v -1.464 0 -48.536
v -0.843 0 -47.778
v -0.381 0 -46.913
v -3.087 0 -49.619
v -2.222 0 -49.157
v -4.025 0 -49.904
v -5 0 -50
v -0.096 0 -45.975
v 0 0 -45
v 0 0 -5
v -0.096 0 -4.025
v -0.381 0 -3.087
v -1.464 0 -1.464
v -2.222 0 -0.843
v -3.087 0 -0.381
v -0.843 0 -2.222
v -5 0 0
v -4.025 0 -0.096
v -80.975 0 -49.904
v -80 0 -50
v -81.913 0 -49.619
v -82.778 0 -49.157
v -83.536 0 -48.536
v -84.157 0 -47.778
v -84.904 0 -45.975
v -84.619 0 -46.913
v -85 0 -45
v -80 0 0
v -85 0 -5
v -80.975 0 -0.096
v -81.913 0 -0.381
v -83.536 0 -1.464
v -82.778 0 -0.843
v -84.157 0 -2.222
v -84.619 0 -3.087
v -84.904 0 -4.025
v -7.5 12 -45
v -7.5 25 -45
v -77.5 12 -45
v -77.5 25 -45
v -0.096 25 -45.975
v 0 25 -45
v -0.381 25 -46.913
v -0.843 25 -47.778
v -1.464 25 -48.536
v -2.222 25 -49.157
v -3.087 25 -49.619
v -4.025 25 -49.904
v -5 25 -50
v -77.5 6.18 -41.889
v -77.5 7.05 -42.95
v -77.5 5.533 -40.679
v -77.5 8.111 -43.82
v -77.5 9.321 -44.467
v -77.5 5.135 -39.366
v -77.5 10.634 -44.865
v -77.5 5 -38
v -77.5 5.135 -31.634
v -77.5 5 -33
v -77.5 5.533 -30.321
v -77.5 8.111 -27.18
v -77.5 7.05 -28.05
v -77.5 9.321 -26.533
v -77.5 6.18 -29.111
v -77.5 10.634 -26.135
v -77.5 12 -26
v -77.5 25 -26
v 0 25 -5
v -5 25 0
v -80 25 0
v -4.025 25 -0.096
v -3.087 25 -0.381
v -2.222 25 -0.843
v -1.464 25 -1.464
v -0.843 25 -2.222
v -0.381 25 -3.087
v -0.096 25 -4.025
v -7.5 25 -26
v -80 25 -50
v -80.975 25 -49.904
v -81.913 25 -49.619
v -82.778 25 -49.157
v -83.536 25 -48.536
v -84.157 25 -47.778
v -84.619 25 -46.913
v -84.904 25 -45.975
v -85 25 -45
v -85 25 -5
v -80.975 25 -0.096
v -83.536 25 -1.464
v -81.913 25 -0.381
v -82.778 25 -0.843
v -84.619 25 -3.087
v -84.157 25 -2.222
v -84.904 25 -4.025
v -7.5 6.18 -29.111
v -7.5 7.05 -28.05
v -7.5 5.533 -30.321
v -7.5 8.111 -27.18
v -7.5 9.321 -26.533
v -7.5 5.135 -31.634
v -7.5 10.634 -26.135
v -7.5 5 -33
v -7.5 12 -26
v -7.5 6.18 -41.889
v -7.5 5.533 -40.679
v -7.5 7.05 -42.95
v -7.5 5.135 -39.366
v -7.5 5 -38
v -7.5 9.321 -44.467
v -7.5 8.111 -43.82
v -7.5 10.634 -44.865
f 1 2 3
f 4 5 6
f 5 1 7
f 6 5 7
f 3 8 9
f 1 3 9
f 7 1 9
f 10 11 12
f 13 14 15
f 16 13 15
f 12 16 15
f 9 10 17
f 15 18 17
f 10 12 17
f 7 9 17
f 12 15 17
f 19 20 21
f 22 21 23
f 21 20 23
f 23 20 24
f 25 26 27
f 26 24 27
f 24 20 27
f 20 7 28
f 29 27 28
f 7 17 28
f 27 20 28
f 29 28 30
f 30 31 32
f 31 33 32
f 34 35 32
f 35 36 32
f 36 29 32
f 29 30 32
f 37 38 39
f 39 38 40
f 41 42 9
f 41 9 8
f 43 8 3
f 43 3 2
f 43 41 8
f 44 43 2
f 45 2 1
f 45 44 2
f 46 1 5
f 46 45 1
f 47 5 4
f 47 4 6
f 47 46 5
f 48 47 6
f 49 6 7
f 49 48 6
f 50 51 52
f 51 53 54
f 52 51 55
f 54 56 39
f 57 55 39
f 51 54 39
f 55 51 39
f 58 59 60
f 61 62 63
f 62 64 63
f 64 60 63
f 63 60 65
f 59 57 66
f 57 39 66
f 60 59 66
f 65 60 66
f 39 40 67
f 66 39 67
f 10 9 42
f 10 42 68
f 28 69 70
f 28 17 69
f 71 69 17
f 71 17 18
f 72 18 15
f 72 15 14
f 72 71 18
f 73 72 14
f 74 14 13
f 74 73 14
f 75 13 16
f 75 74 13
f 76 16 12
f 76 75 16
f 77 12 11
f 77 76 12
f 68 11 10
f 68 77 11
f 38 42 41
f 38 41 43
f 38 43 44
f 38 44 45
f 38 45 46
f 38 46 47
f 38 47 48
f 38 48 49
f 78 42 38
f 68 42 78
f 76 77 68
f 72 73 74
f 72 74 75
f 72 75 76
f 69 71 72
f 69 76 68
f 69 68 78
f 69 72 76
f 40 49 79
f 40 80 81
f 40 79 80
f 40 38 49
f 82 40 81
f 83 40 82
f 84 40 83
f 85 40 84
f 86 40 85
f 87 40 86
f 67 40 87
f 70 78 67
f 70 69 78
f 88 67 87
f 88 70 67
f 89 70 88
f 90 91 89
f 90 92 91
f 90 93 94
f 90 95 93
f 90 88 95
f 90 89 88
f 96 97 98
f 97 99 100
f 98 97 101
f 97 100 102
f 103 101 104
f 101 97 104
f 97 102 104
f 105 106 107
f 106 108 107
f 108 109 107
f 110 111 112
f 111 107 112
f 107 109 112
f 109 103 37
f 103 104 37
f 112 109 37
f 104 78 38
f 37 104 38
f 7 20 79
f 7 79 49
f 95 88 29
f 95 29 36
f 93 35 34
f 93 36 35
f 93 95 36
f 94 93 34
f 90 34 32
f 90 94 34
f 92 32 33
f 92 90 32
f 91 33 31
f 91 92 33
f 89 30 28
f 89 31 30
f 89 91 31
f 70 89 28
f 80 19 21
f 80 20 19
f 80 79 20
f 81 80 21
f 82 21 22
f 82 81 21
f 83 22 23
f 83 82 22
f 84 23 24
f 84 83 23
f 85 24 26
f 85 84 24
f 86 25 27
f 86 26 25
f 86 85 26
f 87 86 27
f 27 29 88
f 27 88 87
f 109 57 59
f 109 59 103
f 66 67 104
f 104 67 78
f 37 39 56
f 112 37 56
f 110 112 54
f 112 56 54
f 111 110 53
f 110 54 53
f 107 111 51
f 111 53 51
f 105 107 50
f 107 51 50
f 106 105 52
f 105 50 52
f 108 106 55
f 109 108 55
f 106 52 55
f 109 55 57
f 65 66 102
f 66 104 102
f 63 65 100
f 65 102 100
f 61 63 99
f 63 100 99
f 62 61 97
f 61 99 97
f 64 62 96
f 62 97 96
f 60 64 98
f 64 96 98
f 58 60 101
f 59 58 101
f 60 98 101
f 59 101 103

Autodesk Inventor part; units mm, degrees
ref_plane "YZ Plane" through (0, 0, 0) normal (1, 0, 0) x (0, 1, 0)
ref_plane "XZ Plane" through (0, 0, 0) normal (0, 1, 0) x (-1, 0, 0)
ref_plane "XY Plane" through (0, 0, 0) normal (0, 0, 1) x (1, 0, 0)
sketch "Sketch1" plane through (0, 0, 0) normal (0, 1, 0) x (-1, 0, 0)
  line L0 (0, 0) -> (85, 0)
  line L1 (85, 0) -> (85, -50)
  line L2 (85, -50) -> (0, -50)
  line L3 (0, -50) -> (0, 0)
  dimension "d0" = 85
  dimension "d1" = 50
extrude "Extrusion1" add sketch "Sketch1" along normal blind 25
sketch "Sketch2" plane through (0, 25, 0) normal (0, 1, 0) x (1, 0, 0)
  line L0 (-77.5, 26) -> (-7.5, 26)
  line L1 (-7.5, 26) -> (-7.5, 45)
  line L2 (-7.5, 45) -> (-77.5, 45)
  line L3 (-77.5, 45) -> (-77.5, 26)
  line L4 (-85, 50) -> (-85, 0) projected
  line L5 (0, 50) -> (-85, 50) projected
  point P0 (0, 0)
  dimension "d4" = 70
  dimension "d5" = 7.5
  dimension "d6" = 5
  dimension "d7" = 19
extrude "Extrusion2" cut sketch "Sketch2" against normal blind 20
fillet "Fillet1" radius 5 4 edges at (-85, 12.5, 0) (-85, 12.5, -50) (0, 12.5, -50) (0, 12.5, 0)
fillet "Fillet2" radius 7 2 edges at (-42.5, 5, -26) (-42.5, 5, -45)
properties part number "Web_server_holder"
